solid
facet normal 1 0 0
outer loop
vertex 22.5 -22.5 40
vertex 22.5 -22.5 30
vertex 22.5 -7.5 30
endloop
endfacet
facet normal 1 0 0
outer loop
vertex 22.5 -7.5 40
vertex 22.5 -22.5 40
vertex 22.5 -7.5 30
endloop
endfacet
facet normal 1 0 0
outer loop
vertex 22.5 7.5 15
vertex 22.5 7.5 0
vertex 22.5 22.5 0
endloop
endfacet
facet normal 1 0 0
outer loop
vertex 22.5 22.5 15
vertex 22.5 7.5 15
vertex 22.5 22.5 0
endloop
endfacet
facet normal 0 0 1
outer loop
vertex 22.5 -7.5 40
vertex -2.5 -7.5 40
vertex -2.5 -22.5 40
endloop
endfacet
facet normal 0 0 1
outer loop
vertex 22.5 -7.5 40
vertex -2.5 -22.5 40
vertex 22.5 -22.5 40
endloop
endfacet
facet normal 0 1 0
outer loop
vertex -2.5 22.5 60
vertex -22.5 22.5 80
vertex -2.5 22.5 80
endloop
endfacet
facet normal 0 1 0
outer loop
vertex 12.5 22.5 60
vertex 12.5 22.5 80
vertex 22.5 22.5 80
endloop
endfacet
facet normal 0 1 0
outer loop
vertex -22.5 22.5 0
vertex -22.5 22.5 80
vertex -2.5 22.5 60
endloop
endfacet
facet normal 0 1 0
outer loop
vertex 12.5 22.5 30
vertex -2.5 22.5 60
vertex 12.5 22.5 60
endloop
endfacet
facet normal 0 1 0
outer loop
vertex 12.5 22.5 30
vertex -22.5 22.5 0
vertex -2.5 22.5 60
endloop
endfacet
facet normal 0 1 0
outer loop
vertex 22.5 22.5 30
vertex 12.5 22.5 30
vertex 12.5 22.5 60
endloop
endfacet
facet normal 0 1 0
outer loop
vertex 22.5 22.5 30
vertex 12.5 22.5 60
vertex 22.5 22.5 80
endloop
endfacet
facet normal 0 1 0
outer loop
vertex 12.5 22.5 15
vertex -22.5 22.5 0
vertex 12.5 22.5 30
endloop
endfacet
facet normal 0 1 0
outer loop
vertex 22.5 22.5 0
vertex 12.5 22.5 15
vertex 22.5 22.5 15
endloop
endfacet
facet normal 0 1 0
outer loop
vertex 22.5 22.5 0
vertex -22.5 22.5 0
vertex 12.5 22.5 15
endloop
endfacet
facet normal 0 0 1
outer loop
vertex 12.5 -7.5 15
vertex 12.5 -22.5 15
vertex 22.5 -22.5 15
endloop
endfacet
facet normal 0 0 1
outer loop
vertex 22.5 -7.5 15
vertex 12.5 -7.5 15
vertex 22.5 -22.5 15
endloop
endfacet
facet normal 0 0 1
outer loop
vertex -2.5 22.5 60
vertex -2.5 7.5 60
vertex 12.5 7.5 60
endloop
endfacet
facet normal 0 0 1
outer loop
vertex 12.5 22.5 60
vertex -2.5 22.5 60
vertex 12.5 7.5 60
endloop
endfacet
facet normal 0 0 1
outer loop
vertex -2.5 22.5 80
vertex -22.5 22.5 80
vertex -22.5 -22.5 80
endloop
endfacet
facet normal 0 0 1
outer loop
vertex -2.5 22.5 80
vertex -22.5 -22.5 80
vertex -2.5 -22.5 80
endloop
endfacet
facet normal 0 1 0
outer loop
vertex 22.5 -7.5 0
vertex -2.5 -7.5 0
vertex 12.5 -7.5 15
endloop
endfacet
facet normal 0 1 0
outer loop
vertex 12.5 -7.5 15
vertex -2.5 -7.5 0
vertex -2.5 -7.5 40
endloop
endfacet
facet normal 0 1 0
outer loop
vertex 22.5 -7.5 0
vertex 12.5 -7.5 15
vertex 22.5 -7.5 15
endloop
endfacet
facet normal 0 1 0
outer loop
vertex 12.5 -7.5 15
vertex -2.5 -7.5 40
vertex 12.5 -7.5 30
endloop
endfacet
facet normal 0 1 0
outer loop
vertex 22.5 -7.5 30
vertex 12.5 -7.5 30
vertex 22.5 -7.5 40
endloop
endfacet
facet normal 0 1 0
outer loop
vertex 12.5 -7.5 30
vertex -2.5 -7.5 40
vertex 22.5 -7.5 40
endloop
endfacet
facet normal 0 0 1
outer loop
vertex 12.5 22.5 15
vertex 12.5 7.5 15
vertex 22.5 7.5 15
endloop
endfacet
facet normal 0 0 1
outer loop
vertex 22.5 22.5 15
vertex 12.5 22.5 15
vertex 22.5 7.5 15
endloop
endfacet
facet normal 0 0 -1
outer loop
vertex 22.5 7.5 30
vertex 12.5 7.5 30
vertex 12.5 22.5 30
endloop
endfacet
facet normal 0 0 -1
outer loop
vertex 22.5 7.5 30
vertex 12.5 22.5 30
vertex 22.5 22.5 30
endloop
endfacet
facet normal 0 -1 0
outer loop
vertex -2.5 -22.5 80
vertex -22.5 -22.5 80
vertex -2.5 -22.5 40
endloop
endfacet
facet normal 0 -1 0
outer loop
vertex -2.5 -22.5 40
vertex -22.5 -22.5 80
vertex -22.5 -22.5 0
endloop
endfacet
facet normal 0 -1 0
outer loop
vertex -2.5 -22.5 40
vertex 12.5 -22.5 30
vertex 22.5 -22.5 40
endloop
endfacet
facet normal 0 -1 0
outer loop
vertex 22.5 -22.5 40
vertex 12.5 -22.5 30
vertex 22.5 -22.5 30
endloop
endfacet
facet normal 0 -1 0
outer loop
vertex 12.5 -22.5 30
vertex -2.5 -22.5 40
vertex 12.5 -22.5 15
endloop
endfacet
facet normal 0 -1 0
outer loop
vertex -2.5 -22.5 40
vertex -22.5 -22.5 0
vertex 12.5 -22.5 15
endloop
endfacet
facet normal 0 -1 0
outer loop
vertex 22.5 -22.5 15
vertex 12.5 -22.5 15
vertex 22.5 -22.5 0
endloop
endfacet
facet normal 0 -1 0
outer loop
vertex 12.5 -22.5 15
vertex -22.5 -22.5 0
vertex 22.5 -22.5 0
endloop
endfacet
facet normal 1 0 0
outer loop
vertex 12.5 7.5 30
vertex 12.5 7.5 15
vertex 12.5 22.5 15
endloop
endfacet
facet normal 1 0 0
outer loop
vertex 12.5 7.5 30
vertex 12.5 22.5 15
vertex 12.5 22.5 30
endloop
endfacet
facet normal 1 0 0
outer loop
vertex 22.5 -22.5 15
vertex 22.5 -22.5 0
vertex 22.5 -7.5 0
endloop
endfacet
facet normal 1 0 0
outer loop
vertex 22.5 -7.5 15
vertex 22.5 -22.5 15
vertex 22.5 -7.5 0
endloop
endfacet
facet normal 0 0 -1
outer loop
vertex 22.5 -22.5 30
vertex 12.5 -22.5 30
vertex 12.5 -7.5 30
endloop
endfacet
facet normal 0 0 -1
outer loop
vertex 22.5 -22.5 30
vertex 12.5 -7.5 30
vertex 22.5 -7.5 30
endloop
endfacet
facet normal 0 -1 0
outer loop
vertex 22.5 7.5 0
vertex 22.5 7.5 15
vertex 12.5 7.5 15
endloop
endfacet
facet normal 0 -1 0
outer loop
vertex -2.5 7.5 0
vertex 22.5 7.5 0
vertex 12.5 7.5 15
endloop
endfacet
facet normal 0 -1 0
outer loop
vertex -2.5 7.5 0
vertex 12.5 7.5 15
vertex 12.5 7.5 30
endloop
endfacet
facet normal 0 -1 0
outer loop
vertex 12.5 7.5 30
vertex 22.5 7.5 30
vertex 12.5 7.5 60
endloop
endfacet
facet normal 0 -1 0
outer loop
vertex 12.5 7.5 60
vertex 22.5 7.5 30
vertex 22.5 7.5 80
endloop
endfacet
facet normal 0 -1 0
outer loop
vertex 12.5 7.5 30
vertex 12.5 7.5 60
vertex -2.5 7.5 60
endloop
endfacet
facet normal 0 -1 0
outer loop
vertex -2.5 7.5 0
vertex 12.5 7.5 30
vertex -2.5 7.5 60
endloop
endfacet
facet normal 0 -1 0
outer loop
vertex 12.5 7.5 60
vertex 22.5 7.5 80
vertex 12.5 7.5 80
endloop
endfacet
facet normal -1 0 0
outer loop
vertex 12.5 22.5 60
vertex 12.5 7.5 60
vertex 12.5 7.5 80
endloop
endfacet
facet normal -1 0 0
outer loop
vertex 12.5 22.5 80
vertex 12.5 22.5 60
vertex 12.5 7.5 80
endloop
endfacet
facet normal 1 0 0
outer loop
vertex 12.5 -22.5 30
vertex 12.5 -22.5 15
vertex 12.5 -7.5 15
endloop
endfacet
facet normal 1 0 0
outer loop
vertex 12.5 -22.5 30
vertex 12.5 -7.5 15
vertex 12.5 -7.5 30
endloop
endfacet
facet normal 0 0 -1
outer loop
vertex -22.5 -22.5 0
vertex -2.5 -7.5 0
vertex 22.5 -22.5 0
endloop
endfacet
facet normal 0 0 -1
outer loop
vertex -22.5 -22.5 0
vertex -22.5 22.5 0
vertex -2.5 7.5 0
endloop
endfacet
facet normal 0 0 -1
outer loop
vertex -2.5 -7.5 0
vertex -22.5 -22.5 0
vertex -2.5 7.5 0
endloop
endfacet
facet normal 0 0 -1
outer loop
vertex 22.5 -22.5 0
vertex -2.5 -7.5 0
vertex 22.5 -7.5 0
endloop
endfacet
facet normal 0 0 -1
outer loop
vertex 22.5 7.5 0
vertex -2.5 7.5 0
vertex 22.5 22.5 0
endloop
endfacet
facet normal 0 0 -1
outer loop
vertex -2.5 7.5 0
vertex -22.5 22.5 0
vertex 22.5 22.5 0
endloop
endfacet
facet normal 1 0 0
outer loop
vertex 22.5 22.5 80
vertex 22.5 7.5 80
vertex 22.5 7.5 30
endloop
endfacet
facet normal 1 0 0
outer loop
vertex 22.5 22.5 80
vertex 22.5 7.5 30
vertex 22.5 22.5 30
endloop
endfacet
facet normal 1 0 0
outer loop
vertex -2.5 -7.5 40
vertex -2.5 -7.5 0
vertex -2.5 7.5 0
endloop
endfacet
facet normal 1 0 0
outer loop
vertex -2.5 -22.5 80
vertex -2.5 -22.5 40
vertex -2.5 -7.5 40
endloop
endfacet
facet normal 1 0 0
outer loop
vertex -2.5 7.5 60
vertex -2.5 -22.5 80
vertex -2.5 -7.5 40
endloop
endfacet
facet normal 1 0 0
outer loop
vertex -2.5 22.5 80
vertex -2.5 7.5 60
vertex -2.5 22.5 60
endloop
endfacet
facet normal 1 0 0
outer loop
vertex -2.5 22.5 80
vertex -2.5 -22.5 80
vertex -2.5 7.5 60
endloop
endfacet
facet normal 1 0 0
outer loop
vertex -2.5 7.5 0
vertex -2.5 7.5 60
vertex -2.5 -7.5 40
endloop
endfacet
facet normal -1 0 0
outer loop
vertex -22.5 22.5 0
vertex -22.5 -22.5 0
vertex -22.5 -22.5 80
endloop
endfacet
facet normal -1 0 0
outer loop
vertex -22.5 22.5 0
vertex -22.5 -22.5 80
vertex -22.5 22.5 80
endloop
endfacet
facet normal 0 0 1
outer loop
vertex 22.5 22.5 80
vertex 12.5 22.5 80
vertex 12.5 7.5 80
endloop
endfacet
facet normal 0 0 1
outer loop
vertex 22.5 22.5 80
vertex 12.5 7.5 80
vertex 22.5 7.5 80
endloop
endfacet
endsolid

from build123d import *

# Parameters (mm, degrees)
F0_W     = 45
F0_H     = 45
F1_DEPTH = 80
F4_DEPTH = 80
F3_W     = 15
F3_H     = 20
F3_W_2   = 10
F3_H_2   = 15
F5_DEPTH = 45
F6_W     = 25
F6_H     = 15
F7_DEPTH = 40
F8_DEPTH = 40


with BuildPart() as f1:
    # F0 (on Top) → F1 (new body)
    with BuildSketch(Plane.XY):
        Rectangle(F0_W, F0_H)
    extrude(amount=F1_DEPTH)

    # F2 (on face) → F4 (cut)
    with BuildSketch(Plane.XY.offset(80)):
        Polygon((22.5, -7.5), (22.5, 7.5), (12.5, 7.5), (-2.5, 7.5), (-2.5, -7.5), (12.5, -7.5), align=None)
    extrude(amount=-F4_DEPTH, mode=Mode.SUBTRACT)

    # F3 (on face) → F5 (cut)
    with BuildSketch(Plane.XZ.offset(22.5)):
        with Locations((5, 70)):
            Rectangle(F3_W, F3_H)
        with Locations((17.5, 22.5)):
            Rectangle(F3_W_2, F3_H_2)
    extrude(amount=-F5_DEPTH, mode=Mode.SUBTRACT)

    # F6 (on face) → F7 (cut)
    with BuildSketch(Plane.XY.offset(80)):
        with Locations((10, -15)):
            Rectangle(F6_W, F6_H)
    extrude(amount=-F7_DEPTH, mode=Mode.SUBTRACT)

    # F6 (on face) → F8 (cut)
    with BuildSketch(Plane.XY.offset(80)):
        with Locations((10, -15)):
            Rectangle(F6_W, F6_H)
    extrude(amount=-F8_DEPTH, mode=Mode.SUBTRACT)


solid = f1.part
